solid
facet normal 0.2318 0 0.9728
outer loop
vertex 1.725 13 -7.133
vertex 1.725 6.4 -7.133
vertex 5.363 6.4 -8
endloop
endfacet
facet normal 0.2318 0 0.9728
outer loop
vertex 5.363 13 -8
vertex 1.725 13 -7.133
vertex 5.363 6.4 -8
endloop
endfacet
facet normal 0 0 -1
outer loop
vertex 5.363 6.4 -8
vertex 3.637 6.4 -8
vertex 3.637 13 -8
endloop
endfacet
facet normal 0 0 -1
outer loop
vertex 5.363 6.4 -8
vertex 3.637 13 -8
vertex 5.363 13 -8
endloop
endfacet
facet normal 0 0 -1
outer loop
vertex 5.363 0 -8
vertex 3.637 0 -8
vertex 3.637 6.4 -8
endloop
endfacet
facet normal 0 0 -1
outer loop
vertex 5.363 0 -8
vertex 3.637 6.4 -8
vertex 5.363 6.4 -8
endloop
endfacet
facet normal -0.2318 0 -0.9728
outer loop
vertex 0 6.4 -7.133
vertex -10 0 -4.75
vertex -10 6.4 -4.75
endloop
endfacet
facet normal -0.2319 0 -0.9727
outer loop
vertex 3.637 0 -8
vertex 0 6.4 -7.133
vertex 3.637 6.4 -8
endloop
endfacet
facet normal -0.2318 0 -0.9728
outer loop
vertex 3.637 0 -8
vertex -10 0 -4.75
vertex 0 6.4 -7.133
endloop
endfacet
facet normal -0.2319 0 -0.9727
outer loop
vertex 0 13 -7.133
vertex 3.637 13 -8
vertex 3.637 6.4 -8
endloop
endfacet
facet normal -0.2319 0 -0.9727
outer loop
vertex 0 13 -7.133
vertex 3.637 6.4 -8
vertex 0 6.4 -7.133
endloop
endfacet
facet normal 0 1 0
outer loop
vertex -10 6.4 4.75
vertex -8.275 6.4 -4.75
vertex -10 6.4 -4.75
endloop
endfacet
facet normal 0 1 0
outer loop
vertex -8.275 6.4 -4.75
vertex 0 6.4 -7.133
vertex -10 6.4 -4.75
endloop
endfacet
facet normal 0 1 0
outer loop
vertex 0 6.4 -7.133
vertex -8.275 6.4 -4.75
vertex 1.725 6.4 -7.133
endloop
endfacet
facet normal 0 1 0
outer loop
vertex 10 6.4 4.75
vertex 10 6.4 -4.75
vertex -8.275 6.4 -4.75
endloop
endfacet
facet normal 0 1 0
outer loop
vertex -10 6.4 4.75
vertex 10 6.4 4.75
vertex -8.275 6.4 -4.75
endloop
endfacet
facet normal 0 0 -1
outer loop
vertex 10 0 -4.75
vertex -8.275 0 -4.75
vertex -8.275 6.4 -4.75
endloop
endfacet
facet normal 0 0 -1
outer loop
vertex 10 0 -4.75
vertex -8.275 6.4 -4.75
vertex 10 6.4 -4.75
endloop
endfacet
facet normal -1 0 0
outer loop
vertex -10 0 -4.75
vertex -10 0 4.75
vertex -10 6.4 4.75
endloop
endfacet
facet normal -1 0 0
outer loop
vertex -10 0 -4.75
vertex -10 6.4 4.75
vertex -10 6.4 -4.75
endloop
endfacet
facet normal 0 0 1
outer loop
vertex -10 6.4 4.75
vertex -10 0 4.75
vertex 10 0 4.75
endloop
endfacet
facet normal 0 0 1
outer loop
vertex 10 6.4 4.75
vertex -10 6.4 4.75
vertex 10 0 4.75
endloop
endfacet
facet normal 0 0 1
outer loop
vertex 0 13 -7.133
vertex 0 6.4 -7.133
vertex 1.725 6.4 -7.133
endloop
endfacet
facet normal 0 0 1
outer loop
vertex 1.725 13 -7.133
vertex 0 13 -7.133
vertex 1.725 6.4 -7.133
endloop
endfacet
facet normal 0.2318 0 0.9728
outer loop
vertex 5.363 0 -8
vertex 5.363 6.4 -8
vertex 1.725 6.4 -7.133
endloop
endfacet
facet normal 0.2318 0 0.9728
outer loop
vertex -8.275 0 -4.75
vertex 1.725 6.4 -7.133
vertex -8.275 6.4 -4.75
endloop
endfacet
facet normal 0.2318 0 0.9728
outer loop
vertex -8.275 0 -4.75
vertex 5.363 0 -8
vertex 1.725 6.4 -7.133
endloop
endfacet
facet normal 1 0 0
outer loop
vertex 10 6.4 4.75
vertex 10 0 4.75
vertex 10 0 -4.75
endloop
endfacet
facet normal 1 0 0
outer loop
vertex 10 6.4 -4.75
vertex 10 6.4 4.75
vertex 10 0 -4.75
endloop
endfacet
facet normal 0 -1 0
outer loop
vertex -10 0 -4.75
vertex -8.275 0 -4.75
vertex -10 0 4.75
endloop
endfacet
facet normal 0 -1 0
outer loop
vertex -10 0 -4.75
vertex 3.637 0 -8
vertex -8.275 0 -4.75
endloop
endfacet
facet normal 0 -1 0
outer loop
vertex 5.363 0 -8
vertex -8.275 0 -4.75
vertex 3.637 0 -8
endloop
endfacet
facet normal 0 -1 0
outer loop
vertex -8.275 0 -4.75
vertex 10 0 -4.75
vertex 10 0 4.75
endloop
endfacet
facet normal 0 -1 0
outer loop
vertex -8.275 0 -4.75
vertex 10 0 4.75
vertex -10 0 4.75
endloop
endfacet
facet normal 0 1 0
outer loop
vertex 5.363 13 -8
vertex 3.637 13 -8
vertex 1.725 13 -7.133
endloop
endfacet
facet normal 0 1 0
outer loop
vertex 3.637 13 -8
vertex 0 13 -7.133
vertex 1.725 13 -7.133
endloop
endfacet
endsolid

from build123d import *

# Parameters (mm, degrees)
AUFSATZ_LINEAR_AUSTRAGEN1_DEPTH = 6.4
AUFSATZ_LINEAR_AUSTRAGEN2_DEPTH = 13


with BuildPart() as part:
    # Skizze1 → Aufsatz-Linear austragen1 (new body)
    with BuildSketch(Plane(origin=(0, 0, 0), x_dir=(1, 0, 0), z_dir=(0, 1, 0))):
        Polygon((-10, 4.75), (-10, -4.75), (10, -4.75), (10, 4.75), (-8.27456026, 4.75), (5.36271987, 8), (3.63728013, 8), align=None)
    extrude(amount=AUFSATZ_LINEAR_AUSTRAGEN1_DEPTH)

    # Skizze1<3> → Aufsatz-Linear austragen2 (add)
    with BuildSketch(Plane(origin=(0, 0, 0), x_dir=(1, 0, 0), z_dir=(0, 1, 0))):
        Polygon((3.63728013, 8), (0, 7.133173161), (1.72543974, 7.133173161), (5.36271987, 8), align=None)
    extrude(amount=AUFSATZ_LINEAR_AUSTRAGEN2_DEPTH)


solid = part.part
